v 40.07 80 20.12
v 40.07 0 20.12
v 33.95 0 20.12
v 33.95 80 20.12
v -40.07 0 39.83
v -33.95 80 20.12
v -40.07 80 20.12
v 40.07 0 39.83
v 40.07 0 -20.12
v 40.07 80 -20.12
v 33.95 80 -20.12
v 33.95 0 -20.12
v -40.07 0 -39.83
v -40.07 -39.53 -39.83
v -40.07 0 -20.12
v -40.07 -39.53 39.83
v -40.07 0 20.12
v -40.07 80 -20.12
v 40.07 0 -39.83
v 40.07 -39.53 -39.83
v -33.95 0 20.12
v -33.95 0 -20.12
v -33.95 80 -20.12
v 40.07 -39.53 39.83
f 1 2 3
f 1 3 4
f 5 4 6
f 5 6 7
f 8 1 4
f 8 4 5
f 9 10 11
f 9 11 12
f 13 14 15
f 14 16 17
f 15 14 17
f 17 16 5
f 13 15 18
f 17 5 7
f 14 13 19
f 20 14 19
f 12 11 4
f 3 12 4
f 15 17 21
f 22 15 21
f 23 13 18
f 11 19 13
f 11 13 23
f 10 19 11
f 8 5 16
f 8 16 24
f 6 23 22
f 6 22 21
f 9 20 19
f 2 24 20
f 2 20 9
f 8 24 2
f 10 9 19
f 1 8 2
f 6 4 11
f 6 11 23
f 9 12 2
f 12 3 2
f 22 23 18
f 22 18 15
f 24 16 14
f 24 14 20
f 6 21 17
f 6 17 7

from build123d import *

# Parameters (mm, degrees)
F0_W     = 80.14
F0_H     = 79.66
F1_DEPTH = 39.53
F2_W     = 67.9
F2_H     = 40.24
F3_DEPTH = 80
F5_DEPTH = 80.14


with BuildPart() as f1:
    # F0 (on Front) → F1 (new body)
    with BuildSketch(Plane.XZ):
        Rectangle(F0_W, F0_H)
    extrude(amount=F1_DEPTH)

    # F2 (on face) → F3 (join)
    with BuildSketch(Plane(origin=(0, 0, 0), x_dir=(-1, 0, 0), z_dir=(0, 1, 0))):
        Rectangle(F2_W, F2_H)
    extrude(amount=F3_DEPTH)

    # F4 (on face) → F5 (join, through all)
    with BuildSketch(Plane.YZ.offset(40.07)):
        Polygon((80, 20.12), (0, 39.83), (0, 20.12), align=None)
        Polygon((80, -20.12), (0, -20.12), (0, -39.83), align=None)
        Polygon((0, 20.12), (0, 39.83), (-39.53, 39.83), (-39.53, -39.83), (0, -39.83), (0, -20.12), align=None)
    extrude(amount=-F5_DEPTH)


solid = f1.part
